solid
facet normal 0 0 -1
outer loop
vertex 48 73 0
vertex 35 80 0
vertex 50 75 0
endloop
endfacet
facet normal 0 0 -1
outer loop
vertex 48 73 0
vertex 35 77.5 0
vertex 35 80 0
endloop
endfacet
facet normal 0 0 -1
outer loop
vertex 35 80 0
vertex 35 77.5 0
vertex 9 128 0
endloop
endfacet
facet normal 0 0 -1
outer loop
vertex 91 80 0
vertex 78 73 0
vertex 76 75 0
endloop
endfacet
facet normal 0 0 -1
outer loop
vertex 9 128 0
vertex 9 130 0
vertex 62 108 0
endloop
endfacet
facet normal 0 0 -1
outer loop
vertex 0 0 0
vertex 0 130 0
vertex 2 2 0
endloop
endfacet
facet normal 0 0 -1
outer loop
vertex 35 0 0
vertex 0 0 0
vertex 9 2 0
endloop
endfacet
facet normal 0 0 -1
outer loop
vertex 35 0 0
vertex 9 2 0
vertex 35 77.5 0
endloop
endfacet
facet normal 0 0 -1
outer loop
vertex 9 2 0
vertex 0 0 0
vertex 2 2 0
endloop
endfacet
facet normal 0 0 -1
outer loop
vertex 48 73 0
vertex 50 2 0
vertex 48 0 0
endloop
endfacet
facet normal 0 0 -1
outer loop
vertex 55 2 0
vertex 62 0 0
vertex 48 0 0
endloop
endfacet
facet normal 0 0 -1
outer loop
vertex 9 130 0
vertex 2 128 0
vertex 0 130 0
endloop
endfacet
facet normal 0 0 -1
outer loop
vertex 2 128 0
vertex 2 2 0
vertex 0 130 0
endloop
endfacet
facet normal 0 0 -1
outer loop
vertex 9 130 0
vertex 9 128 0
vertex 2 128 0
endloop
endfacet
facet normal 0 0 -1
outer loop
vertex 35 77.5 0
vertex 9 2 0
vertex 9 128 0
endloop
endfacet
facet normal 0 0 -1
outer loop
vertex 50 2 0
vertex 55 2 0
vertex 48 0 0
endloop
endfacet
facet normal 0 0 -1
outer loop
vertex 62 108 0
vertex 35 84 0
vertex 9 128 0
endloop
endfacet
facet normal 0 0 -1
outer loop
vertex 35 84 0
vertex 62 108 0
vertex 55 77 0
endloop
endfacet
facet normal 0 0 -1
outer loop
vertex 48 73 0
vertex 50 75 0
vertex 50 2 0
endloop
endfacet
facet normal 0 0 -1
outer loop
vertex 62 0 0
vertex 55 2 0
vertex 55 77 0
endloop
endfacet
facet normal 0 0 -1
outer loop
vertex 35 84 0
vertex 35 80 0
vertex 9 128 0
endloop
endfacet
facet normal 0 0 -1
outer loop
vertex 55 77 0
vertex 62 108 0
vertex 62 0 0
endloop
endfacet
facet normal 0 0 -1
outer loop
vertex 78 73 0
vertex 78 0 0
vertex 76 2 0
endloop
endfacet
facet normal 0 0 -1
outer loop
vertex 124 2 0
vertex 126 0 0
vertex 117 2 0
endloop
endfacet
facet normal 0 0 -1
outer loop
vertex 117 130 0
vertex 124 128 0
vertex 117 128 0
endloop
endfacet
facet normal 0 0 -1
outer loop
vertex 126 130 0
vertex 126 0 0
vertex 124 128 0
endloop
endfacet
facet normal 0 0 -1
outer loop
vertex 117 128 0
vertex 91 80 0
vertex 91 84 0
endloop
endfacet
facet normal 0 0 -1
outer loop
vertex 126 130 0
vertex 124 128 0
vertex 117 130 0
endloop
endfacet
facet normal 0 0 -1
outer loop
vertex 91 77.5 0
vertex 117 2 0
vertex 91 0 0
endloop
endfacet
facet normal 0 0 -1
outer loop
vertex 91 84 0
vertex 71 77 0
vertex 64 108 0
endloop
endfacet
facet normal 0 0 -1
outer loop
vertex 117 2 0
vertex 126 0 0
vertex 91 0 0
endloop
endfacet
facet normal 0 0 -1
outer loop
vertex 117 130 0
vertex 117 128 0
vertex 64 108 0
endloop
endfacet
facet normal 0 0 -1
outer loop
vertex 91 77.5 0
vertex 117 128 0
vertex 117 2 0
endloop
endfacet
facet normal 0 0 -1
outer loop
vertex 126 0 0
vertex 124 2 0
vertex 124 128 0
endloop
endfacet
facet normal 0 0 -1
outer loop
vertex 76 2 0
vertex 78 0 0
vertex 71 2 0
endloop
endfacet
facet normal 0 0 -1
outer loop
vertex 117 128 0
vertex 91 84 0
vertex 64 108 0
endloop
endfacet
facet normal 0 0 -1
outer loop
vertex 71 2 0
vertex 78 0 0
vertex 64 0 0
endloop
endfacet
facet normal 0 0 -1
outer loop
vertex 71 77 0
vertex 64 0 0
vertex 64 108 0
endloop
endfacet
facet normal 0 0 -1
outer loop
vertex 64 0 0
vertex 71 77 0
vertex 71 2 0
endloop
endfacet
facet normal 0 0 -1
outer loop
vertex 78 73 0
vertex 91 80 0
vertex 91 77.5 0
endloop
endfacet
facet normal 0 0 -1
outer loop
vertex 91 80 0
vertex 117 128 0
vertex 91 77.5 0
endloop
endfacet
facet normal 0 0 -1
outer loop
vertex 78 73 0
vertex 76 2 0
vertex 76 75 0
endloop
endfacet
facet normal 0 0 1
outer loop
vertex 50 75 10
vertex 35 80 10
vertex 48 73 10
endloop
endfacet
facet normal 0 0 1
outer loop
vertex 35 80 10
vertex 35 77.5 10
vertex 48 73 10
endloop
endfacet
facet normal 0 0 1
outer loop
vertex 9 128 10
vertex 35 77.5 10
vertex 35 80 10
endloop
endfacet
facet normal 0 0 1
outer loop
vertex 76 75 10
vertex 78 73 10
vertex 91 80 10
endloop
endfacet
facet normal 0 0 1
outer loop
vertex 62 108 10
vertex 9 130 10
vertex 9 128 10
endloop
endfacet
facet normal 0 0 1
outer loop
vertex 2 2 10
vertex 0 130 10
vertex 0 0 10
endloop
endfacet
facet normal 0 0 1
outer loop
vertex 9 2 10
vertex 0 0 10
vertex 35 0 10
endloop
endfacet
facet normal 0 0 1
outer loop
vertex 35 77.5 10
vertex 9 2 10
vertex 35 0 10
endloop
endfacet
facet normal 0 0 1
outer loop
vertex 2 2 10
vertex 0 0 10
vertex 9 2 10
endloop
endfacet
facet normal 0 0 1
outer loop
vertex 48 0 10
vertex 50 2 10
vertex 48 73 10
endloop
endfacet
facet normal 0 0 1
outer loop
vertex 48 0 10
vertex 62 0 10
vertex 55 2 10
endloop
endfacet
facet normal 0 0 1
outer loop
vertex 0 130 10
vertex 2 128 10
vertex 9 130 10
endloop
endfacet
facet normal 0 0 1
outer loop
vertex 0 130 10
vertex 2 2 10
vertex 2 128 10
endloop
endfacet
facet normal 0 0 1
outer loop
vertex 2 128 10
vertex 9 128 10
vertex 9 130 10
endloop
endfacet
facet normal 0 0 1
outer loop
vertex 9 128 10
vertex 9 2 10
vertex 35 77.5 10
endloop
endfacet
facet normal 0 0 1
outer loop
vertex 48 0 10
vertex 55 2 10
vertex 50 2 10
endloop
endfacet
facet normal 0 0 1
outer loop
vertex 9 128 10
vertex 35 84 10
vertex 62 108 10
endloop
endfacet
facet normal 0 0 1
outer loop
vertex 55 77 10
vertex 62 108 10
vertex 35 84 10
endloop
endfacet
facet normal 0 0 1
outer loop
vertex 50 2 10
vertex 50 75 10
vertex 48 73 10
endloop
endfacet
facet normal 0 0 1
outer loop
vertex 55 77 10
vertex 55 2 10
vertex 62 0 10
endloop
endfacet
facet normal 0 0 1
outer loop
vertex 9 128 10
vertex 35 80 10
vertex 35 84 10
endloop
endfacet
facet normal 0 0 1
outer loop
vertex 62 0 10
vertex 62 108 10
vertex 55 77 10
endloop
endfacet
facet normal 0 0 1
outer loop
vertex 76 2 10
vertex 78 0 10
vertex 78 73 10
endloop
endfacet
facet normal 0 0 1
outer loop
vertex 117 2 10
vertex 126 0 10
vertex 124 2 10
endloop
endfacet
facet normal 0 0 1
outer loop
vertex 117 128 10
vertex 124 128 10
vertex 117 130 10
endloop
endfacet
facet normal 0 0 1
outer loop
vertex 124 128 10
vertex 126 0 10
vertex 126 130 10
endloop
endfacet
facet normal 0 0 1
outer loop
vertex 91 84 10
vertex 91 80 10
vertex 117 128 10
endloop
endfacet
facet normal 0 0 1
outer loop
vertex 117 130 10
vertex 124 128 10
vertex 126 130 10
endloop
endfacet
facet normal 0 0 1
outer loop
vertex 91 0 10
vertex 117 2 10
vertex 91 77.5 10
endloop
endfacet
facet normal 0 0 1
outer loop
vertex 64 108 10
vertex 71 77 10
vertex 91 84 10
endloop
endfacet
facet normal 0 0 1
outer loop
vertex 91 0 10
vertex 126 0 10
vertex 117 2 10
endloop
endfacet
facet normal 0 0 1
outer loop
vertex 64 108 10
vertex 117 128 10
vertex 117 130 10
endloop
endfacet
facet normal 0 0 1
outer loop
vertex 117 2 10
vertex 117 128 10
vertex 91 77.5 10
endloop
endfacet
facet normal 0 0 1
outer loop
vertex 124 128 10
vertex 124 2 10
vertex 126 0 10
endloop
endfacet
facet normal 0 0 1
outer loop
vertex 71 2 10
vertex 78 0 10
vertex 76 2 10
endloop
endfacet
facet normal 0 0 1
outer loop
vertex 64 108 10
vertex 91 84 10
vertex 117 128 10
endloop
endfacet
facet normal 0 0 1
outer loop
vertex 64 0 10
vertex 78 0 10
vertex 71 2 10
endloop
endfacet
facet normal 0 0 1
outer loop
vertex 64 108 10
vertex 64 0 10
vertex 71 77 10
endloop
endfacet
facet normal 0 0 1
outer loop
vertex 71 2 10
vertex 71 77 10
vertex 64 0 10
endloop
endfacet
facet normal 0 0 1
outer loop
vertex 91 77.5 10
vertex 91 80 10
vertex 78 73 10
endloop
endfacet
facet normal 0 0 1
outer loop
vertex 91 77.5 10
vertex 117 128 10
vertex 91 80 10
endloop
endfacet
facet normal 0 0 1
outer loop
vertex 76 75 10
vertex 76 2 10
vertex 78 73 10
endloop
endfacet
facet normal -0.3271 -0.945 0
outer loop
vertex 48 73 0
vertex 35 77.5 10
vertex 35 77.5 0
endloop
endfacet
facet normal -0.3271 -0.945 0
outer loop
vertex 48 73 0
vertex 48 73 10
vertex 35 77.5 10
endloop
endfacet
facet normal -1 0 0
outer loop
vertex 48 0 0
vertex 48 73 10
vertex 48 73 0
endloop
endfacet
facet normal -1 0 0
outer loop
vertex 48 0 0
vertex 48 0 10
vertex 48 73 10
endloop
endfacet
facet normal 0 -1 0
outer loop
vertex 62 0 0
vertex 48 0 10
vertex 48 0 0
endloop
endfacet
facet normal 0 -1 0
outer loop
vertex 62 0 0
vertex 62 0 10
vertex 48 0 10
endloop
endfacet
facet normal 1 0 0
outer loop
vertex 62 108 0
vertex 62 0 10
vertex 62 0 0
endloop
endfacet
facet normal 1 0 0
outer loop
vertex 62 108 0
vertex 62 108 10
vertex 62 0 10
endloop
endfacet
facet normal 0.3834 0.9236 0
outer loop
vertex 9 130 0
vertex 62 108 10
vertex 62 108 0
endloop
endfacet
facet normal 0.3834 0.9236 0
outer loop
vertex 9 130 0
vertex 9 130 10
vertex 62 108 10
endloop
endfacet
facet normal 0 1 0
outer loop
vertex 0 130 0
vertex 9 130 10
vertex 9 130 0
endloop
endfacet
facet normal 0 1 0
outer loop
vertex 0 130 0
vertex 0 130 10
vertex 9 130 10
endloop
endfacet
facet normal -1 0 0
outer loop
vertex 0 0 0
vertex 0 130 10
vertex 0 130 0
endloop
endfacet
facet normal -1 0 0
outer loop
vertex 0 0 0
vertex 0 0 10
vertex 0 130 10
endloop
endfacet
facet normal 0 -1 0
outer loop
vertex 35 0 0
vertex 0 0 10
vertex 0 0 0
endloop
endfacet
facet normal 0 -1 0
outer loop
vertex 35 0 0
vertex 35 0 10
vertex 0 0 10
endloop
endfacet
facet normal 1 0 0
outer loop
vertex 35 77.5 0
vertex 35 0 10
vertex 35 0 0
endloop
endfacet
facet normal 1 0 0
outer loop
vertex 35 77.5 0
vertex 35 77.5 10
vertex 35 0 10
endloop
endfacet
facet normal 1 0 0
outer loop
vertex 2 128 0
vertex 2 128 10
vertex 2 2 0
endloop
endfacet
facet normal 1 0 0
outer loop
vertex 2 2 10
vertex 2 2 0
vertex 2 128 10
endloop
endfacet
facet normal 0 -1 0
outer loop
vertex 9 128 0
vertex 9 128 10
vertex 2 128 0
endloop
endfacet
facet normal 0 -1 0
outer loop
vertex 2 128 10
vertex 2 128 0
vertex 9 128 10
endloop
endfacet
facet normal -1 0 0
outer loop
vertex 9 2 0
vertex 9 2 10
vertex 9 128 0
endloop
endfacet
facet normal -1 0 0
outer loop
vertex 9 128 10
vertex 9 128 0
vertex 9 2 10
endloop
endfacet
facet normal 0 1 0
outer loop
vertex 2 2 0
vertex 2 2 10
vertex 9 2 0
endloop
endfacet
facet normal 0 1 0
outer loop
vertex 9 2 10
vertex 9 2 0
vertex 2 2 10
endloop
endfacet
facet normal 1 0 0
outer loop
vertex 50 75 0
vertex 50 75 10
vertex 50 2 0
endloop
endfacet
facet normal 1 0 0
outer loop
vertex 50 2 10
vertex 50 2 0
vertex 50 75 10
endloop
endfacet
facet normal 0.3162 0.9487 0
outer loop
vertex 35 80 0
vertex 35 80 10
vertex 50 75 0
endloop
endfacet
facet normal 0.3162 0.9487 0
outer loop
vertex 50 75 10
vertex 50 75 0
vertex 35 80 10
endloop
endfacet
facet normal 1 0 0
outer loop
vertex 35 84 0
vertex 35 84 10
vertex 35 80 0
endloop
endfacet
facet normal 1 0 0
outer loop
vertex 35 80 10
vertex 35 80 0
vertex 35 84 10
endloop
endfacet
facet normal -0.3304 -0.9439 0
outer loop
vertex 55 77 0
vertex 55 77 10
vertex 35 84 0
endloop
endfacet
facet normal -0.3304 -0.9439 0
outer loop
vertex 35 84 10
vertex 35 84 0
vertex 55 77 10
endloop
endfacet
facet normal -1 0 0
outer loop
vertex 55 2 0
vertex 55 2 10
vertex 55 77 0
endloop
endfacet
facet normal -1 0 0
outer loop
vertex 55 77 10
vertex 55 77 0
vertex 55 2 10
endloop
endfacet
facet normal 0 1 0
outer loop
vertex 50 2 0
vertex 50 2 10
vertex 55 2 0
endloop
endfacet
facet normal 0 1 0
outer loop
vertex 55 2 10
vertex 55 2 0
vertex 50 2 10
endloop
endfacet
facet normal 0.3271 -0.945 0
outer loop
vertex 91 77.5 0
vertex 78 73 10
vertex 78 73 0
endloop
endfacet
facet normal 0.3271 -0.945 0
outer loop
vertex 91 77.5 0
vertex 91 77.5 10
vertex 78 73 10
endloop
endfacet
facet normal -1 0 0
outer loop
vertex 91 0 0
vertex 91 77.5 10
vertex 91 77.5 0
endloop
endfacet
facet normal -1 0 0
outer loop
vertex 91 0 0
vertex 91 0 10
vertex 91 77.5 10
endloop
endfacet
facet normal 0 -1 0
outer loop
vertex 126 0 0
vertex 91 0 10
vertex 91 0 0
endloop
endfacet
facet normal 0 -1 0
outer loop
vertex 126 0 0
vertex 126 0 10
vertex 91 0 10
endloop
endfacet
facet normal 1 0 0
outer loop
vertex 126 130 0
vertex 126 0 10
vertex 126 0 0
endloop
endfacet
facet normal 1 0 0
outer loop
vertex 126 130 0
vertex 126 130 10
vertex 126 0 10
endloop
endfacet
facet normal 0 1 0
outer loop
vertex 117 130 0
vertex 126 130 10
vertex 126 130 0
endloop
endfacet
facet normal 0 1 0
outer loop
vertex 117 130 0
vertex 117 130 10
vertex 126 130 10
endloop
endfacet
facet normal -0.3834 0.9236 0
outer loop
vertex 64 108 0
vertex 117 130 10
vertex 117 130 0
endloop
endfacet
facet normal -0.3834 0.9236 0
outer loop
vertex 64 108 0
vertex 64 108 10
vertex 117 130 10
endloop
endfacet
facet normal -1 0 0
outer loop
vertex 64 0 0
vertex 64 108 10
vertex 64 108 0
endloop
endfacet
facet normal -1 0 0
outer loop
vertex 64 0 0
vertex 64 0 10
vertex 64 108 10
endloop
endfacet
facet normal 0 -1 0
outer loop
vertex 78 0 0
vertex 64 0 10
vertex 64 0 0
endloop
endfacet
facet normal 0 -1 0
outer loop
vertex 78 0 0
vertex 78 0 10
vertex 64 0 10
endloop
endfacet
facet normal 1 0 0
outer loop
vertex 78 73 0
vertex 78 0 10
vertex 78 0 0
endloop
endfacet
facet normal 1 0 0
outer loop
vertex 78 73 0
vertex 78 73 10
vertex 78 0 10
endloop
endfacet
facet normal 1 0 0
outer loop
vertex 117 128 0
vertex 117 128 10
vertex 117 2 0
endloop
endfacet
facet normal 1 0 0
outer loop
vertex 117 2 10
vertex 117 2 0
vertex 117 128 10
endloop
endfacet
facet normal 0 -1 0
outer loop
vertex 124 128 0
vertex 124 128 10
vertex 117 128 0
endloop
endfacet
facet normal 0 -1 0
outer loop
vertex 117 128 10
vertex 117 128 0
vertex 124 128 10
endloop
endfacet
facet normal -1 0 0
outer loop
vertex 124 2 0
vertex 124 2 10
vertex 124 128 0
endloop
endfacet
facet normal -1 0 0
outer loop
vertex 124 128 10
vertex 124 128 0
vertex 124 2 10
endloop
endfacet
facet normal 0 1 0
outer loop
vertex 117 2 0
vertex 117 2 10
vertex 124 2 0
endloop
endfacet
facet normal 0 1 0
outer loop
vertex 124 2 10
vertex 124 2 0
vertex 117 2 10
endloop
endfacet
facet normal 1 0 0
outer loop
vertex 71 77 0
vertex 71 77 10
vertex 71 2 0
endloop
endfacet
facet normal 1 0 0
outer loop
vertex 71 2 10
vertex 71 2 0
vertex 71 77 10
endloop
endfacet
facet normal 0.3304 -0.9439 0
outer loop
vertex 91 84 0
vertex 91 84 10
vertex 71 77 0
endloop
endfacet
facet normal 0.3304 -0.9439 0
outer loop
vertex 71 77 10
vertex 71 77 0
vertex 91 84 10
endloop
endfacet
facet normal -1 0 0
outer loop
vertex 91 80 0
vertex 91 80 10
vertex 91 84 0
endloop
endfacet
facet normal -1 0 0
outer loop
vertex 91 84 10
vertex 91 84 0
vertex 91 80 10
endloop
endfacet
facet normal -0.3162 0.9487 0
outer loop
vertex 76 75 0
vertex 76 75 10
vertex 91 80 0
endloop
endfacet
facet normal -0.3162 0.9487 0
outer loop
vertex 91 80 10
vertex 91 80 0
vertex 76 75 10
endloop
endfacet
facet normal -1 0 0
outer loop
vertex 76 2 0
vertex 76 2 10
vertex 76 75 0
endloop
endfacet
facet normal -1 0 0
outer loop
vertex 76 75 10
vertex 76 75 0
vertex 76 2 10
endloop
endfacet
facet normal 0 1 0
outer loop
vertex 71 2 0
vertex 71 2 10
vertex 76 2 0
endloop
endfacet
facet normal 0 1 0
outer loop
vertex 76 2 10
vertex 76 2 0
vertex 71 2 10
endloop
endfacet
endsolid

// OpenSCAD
module render_master_half() {
 polygon(points=[
    [0,0],[0,130],[9,130],[62,108],[62,0],[50,0],[50,2],[55,2],
    [55,77],[35,84],[35,80],[50,75],[50,0],[48,0],[48,73],[35,77.5],
    [35,0],[9,0],[9,128],[2,128],[2,2],[9,2],[9,0]]);
};

module render_master() {
render_master_half();
translate([126,0,0]) mirror() render_master_half();
};

linear_extrude(height=10)
render_master();
